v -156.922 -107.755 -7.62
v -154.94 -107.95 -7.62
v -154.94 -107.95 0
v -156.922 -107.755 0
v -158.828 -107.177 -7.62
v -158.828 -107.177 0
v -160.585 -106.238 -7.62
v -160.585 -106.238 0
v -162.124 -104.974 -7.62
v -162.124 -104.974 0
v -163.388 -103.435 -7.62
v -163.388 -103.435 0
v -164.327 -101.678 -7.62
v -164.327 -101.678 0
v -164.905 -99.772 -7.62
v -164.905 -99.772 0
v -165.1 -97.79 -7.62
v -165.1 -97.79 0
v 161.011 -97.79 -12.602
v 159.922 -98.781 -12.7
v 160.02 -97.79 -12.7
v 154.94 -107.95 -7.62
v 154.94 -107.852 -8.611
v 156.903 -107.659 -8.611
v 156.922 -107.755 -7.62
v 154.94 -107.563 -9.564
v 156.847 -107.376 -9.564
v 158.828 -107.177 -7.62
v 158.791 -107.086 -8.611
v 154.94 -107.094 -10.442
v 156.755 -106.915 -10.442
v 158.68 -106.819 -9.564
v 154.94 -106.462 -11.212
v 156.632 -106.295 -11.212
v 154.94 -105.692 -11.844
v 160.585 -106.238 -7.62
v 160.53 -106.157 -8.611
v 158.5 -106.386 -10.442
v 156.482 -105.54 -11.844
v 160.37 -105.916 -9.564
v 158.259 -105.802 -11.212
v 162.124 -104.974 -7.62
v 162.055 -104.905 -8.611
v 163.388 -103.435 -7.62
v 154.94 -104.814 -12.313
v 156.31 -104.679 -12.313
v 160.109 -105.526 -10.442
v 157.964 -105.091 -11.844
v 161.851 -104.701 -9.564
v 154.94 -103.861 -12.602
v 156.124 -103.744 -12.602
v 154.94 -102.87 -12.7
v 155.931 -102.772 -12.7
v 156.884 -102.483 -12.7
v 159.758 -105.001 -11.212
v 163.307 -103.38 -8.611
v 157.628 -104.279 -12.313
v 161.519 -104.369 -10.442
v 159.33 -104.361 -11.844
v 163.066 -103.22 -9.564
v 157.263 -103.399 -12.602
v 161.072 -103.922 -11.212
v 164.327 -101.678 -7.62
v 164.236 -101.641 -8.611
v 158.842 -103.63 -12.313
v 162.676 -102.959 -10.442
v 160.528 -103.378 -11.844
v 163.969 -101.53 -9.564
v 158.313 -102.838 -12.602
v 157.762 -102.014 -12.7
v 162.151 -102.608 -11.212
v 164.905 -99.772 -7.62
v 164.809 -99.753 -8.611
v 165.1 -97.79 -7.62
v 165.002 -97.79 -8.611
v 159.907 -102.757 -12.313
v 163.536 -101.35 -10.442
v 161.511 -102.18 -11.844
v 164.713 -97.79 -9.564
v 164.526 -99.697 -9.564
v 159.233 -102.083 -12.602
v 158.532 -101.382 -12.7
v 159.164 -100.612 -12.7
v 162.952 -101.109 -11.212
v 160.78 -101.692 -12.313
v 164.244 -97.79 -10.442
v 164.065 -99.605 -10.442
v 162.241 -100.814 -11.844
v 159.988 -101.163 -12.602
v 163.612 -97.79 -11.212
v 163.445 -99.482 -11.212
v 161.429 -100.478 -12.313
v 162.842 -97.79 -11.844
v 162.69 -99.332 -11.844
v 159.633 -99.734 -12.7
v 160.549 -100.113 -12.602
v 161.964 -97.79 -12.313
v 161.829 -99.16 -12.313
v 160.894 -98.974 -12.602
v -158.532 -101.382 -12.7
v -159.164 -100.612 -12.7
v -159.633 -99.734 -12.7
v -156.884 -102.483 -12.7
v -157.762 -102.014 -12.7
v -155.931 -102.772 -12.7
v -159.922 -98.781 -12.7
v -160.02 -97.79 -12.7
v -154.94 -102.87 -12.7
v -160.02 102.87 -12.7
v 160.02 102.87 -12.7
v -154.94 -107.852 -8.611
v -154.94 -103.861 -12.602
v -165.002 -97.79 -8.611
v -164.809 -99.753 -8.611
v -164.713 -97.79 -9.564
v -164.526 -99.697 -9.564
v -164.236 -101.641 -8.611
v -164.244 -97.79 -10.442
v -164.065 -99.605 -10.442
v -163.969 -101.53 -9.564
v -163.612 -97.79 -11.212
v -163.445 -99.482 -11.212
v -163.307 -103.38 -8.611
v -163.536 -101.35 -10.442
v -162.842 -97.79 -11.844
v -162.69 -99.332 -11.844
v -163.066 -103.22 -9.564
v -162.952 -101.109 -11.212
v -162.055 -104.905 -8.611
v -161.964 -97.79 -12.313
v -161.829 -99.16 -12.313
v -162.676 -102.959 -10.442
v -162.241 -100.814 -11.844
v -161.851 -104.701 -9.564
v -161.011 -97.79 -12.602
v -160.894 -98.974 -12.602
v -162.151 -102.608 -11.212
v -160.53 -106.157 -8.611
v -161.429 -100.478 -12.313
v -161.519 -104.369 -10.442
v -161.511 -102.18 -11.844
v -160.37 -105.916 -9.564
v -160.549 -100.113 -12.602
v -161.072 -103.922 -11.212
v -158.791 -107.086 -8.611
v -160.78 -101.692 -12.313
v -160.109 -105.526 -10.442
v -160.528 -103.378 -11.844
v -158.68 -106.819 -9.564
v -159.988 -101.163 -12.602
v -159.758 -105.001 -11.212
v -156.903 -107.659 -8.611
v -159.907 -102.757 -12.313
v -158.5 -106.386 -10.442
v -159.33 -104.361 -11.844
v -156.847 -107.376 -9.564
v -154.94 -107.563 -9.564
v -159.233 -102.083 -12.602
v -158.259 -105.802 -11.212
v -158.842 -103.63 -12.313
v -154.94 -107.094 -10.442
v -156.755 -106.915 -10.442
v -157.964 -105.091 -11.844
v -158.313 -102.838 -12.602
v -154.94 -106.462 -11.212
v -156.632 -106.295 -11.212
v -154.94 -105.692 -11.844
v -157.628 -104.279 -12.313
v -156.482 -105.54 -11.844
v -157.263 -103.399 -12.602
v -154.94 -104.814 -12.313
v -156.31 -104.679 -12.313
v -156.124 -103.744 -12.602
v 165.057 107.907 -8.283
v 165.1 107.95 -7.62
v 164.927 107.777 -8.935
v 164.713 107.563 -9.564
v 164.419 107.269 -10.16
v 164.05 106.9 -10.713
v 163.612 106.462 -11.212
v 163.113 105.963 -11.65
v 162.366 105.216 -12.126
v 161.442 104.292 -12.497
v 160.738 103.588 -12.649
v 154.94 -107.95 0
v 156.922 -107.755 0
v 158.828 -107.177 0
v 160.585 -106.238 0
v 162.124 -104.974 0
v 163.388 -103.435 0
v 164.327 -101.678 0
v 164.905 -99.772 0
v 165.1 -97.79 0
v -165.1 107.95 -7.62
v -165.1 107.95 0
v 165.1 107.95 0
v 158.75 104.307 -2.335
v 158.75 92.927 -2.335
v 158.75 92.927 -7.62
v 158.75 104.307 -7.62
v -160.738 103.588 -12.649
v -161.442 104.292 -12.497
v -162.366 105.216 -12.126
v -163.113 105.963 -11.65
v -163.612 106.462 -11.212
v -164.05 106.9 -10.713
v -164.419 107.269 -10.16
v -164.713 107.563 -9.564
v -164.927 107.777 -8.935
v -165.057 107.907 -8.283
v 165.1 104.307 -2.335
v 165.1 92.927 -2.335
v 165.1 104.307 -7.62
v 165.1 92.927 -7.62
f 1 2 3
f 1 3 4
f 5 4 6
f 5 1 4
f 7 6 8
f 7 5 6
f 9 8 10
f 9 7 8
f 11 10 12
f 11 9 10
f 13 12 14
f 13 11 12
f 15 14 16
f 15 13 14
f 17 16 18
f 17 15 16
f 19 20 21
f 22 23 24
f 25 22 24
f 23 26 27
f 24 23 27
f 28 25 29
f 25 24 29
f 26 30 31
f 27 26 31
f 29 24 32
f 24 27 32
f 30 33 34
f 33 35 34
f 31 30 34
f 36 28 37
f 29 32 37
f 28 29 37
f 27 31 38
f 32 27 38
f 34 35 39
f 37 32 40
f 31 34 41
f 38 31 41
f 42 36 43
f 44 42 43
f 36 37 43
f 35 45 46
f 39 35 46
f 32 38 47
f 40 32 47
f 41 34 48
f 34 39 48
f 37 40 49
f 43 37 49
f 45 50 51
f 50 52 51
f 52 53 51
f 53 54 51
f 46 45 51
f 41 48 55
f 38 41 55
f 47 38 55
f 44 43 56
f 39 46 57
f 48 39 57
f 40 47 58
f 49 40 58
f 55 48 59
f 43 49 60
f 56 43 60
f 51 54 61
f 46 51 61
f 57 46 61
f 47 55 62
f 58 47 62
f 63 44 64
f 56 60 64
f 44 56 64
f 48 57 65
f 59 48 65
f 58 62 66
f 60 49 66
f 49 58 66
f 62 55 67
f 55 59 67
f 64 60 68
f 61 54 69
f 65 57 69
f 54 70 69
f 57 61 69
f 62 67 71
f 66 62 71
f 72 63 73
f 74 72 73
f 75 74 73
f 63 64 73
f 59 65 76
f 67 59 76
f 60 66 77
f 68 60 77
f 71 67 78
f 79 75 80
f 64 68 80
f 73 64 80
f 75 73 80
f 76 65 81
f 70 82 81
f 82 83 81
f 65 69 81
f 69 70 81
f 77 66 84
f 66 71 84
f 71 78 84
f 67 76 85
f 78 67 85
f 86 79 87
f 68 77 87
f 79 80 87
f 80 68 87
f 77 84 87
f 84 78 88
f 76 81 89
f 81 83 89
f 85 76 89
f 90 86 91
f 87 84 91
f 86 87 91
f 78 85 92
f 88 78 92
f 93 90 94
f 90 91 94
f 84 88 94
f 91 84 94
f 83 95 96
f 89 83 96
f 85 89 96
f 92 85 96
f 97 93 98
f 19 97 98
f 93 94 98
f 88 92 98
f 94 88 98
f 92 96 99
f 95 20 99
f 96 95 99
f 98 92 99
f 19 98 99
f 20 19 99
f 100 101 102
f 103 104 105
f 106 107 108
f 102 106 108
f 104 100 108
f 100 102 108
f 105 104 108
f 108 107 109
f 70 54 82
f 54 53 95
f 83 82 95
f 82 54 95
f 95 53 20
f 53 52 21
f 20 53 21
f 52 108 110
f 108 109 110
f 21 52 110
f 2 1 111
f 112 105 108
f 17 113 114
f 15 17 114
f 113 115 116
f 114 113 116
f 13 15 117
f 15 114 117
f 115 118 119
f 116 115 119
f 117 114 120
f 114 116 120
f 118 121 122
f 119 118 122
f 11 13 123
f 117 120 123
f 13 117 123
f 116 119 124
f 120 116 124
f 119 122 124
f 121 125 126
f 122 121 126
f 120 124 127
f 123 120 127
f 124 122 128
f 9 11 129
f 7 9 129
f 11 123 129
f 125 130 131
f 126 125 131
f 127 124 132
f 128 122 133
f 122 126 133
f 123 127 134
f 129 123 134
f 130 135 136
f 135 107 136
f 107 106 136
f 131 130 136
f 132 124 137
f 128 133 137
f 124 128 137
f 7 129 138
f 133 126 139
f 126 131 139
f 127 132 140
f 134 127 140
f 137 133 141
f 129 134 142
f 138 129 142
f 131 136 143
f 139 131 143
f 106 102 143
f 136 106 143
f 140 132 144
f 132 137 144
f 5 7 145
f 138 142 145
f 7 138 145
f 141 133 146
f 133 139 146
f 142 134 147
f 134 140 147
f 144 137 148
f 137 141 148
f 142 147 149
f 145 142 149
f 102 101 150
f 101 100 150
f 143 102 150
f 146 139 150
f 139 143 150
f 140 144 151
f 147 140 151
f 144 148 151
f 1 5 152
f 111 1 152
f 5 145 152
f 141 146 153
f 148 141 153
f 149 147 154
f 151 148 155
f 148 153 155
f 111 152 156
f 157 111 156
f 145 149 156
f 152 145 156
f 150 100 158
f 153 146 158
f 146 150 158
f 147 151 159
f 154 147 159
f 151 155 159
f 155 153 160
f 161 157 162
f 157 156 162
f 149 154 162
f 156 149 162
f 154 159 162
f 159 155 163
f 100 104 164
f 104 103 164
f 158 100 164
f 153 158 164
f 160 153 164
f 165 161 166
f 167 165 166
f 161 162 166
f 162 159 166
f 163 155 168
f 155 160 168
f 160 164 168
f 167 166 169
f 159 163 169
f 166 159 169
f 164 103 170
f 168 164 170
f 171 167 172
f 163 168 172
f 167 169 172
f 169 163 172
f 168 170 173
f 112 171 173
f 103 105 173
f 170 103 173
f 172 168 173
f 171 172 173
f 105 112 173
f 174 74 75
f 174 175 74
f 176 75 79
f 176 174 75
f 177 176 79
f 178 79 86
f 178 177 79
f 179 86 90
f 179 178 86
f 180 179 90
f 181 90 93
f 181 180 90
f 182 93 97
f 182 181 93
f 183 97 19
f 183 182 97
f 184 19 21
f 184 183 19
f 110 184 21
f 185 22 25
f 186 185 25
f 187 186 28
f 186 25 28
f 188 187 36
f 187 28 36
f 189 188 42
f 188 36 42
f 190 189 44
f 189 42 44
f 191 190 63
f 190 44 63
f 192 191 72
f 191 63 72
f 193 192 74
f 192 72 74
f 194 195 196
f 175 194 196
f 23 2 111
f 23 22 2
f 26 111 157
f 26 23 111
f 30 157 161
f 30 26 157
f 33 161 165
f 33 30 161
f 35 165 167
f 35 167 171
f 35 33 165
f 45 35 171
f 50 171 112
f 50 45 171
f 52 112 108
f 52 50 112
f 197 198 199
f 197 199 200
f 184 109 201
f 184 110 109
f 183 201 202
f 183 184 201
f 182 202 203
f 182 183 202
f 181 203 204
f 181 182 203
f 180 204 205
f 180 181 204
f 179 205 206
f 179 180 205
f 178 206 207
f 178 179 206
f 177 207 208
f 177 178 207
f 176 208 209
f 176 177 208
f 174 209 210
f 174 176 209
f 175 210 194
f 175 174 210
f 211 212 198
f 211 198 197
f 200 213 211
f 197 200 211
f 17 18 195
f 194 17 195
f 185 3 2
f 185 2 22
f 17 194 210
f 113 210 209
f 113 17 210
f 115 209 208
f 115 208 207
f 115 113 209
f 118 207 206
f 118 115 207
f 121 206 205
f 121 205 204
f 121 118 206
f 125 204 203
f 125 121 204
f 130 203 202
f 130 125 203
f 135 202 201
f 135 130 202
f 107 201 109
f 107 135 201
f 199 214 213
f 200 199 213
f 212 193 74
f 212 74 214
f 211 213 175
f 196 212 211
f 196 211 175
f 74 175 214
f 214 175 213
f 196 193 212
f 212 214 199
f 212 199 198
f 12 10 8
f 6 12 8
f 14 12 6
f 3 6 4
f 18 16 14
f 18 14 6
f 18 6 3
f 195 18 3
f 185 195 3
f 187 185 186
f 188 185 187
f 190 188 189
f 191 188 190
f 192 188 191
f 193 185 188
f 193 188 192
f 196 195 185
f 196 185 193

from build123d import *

# Parameters (mm, degrees)
F0_W     = 330.2
F0_H     = 215.9
F1_DEPTH = 12.7
F2_R     = 10.16
F3_R     = 10.16
F4_R     = 5.08
F5_W     = 15.24
F5_H     = 4.572
F6_DEPTH = 10.16
F7_W     = 11.379987
F7_H     = 5.284949
F8_DEPTH = 6.35


with BuildPart() as f1:
    # F0 (on Top) → F1 (new body)
    with BuildSketch(Plane.XY):
        Rectangle(F0_W, F0_H)
    extrude(amount=-F1_DEPTH)

    # F2
    f2_edges = [f1.edges().sort_by_distance(p)[0] for p in [
        (165.1, -107.95, -6.35),
    ]]
    fillet(f2_edges, radius=F2_R)

    # F3
    f3_edges = [f1.edges().sort_by_distance(p)[0] for p in [
        (-165.1, -107.95, -6.35),
    ]]
    fillet(f3_edges, radius=F3_R)

    # F4
    f4_edges = [f1.edges().sort_by_distance(p)[0] for p in [
        (0, -107.95, -12.7),
        (-162.124205, -104.974205, -12.7),
        (162.124205, -104.974205, -12.7),
        (-165.1, 5.08, -12.7),
        (165.1, 5.08, -12.7),
        (0, 107.95, -12.7),
    ]]
    fillet(f4_edges, radius=F4_R)

    # F5 (on face) → F6 (join)
    with BuildSketch(Plane.YZ.offset(165.1)):
        with Locations((97.510784, -5.334)):
            Rectangle(F5_W, F5_H)
    extrude(amount=-F6_DEPTH)

    # F7 (on face) → F8 (cut)
    with BuildSketch(Plane.YZ.offset(165.1)):
        with Locations((98.617143, -4.977525)):
            Rectangle(F7_W, F7_H)
    extrude(amount=-F8_DEPTH, mode=Mode.SUBTRACT)


solid = f1.part
